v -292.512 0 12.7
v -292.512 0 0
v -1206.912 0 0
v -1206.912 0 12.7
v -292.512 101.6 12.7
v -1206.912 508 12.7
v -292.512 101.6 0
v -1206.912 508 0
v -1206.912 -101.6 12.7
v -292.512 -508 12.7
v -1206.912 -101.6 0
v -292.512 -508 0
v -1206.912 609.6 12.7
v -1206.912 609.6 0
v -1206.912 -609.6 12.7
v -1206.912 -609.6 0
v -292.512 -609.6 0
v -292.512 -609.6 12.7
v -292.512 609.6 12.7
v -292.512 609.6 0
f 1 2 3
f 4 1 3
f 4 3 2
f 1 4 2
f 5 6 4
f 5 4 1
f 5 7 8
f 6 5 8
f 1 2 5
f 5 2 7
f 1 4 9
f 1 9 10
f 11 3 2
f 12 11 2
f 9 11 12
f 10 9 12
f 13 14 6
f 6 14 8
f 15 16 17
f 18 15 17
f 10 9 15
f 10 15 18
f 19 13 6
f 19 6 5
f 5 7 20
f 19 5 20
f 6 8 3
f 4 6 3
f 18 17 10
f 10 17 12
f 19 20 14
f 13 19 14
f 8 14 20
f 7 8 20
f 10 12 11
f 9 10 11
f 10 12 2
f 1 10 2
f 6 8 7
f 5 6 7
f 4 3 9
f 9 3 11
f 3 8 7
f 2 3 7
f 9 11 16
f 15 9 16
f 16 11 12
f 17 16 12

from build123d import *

# Parameters (mm, degrees)
F1_DEPTH = 12.7
F2_DEPTH = 12.7
F3_DEPTH = 12.7
F4_DEPTH = 12.7


with BuildPart() as f1:
    # F0 (on Top) → F1 (new body)
    with BuildSketch(Plane.XY):
        Polygon((-292.512335, 609.6), (-1206.912335, 609.6), (-1206.912335, 508), (-292.512335, 101.6), align=None)
    extrude(amount=F1_DEPTH)


with BuildPart() as f2:
    # F0 (on Top) → F2 (new body)
    with BuildSketch(Plane.XY):
        Polygon((-292.512335, 101.6), (-1206.912335, 508), (-1206.912335, 0), (-292.512335, 0), align=None)
    extrude(amount=F2_DEPTH)


with BuildPart() as f3:
    # F0 (on Top) → F3 (new body)
    with BuildSketch(Plane.XY):
        Polygon((-292.512335, 0), (-1206.912335, 0), (-1206.912335, -101.6), (-292.512335, -508), align=None)
    extrude(amount=F3_DEPTH)


with BuildPart() as f4:
    # F0 (on Top) → F4 (new body)
    with BuildSketch(Plane.XY):
        Polygon((-292.512335, -508), (-1206.912335, -101.6), (-1206.912335, -609.6), (-292.512335, -609.6), align=None)
    extrude(amount=F4_DEPTH)


solid = Compound([f1.part, f2.part, f3.part, f4.part])
